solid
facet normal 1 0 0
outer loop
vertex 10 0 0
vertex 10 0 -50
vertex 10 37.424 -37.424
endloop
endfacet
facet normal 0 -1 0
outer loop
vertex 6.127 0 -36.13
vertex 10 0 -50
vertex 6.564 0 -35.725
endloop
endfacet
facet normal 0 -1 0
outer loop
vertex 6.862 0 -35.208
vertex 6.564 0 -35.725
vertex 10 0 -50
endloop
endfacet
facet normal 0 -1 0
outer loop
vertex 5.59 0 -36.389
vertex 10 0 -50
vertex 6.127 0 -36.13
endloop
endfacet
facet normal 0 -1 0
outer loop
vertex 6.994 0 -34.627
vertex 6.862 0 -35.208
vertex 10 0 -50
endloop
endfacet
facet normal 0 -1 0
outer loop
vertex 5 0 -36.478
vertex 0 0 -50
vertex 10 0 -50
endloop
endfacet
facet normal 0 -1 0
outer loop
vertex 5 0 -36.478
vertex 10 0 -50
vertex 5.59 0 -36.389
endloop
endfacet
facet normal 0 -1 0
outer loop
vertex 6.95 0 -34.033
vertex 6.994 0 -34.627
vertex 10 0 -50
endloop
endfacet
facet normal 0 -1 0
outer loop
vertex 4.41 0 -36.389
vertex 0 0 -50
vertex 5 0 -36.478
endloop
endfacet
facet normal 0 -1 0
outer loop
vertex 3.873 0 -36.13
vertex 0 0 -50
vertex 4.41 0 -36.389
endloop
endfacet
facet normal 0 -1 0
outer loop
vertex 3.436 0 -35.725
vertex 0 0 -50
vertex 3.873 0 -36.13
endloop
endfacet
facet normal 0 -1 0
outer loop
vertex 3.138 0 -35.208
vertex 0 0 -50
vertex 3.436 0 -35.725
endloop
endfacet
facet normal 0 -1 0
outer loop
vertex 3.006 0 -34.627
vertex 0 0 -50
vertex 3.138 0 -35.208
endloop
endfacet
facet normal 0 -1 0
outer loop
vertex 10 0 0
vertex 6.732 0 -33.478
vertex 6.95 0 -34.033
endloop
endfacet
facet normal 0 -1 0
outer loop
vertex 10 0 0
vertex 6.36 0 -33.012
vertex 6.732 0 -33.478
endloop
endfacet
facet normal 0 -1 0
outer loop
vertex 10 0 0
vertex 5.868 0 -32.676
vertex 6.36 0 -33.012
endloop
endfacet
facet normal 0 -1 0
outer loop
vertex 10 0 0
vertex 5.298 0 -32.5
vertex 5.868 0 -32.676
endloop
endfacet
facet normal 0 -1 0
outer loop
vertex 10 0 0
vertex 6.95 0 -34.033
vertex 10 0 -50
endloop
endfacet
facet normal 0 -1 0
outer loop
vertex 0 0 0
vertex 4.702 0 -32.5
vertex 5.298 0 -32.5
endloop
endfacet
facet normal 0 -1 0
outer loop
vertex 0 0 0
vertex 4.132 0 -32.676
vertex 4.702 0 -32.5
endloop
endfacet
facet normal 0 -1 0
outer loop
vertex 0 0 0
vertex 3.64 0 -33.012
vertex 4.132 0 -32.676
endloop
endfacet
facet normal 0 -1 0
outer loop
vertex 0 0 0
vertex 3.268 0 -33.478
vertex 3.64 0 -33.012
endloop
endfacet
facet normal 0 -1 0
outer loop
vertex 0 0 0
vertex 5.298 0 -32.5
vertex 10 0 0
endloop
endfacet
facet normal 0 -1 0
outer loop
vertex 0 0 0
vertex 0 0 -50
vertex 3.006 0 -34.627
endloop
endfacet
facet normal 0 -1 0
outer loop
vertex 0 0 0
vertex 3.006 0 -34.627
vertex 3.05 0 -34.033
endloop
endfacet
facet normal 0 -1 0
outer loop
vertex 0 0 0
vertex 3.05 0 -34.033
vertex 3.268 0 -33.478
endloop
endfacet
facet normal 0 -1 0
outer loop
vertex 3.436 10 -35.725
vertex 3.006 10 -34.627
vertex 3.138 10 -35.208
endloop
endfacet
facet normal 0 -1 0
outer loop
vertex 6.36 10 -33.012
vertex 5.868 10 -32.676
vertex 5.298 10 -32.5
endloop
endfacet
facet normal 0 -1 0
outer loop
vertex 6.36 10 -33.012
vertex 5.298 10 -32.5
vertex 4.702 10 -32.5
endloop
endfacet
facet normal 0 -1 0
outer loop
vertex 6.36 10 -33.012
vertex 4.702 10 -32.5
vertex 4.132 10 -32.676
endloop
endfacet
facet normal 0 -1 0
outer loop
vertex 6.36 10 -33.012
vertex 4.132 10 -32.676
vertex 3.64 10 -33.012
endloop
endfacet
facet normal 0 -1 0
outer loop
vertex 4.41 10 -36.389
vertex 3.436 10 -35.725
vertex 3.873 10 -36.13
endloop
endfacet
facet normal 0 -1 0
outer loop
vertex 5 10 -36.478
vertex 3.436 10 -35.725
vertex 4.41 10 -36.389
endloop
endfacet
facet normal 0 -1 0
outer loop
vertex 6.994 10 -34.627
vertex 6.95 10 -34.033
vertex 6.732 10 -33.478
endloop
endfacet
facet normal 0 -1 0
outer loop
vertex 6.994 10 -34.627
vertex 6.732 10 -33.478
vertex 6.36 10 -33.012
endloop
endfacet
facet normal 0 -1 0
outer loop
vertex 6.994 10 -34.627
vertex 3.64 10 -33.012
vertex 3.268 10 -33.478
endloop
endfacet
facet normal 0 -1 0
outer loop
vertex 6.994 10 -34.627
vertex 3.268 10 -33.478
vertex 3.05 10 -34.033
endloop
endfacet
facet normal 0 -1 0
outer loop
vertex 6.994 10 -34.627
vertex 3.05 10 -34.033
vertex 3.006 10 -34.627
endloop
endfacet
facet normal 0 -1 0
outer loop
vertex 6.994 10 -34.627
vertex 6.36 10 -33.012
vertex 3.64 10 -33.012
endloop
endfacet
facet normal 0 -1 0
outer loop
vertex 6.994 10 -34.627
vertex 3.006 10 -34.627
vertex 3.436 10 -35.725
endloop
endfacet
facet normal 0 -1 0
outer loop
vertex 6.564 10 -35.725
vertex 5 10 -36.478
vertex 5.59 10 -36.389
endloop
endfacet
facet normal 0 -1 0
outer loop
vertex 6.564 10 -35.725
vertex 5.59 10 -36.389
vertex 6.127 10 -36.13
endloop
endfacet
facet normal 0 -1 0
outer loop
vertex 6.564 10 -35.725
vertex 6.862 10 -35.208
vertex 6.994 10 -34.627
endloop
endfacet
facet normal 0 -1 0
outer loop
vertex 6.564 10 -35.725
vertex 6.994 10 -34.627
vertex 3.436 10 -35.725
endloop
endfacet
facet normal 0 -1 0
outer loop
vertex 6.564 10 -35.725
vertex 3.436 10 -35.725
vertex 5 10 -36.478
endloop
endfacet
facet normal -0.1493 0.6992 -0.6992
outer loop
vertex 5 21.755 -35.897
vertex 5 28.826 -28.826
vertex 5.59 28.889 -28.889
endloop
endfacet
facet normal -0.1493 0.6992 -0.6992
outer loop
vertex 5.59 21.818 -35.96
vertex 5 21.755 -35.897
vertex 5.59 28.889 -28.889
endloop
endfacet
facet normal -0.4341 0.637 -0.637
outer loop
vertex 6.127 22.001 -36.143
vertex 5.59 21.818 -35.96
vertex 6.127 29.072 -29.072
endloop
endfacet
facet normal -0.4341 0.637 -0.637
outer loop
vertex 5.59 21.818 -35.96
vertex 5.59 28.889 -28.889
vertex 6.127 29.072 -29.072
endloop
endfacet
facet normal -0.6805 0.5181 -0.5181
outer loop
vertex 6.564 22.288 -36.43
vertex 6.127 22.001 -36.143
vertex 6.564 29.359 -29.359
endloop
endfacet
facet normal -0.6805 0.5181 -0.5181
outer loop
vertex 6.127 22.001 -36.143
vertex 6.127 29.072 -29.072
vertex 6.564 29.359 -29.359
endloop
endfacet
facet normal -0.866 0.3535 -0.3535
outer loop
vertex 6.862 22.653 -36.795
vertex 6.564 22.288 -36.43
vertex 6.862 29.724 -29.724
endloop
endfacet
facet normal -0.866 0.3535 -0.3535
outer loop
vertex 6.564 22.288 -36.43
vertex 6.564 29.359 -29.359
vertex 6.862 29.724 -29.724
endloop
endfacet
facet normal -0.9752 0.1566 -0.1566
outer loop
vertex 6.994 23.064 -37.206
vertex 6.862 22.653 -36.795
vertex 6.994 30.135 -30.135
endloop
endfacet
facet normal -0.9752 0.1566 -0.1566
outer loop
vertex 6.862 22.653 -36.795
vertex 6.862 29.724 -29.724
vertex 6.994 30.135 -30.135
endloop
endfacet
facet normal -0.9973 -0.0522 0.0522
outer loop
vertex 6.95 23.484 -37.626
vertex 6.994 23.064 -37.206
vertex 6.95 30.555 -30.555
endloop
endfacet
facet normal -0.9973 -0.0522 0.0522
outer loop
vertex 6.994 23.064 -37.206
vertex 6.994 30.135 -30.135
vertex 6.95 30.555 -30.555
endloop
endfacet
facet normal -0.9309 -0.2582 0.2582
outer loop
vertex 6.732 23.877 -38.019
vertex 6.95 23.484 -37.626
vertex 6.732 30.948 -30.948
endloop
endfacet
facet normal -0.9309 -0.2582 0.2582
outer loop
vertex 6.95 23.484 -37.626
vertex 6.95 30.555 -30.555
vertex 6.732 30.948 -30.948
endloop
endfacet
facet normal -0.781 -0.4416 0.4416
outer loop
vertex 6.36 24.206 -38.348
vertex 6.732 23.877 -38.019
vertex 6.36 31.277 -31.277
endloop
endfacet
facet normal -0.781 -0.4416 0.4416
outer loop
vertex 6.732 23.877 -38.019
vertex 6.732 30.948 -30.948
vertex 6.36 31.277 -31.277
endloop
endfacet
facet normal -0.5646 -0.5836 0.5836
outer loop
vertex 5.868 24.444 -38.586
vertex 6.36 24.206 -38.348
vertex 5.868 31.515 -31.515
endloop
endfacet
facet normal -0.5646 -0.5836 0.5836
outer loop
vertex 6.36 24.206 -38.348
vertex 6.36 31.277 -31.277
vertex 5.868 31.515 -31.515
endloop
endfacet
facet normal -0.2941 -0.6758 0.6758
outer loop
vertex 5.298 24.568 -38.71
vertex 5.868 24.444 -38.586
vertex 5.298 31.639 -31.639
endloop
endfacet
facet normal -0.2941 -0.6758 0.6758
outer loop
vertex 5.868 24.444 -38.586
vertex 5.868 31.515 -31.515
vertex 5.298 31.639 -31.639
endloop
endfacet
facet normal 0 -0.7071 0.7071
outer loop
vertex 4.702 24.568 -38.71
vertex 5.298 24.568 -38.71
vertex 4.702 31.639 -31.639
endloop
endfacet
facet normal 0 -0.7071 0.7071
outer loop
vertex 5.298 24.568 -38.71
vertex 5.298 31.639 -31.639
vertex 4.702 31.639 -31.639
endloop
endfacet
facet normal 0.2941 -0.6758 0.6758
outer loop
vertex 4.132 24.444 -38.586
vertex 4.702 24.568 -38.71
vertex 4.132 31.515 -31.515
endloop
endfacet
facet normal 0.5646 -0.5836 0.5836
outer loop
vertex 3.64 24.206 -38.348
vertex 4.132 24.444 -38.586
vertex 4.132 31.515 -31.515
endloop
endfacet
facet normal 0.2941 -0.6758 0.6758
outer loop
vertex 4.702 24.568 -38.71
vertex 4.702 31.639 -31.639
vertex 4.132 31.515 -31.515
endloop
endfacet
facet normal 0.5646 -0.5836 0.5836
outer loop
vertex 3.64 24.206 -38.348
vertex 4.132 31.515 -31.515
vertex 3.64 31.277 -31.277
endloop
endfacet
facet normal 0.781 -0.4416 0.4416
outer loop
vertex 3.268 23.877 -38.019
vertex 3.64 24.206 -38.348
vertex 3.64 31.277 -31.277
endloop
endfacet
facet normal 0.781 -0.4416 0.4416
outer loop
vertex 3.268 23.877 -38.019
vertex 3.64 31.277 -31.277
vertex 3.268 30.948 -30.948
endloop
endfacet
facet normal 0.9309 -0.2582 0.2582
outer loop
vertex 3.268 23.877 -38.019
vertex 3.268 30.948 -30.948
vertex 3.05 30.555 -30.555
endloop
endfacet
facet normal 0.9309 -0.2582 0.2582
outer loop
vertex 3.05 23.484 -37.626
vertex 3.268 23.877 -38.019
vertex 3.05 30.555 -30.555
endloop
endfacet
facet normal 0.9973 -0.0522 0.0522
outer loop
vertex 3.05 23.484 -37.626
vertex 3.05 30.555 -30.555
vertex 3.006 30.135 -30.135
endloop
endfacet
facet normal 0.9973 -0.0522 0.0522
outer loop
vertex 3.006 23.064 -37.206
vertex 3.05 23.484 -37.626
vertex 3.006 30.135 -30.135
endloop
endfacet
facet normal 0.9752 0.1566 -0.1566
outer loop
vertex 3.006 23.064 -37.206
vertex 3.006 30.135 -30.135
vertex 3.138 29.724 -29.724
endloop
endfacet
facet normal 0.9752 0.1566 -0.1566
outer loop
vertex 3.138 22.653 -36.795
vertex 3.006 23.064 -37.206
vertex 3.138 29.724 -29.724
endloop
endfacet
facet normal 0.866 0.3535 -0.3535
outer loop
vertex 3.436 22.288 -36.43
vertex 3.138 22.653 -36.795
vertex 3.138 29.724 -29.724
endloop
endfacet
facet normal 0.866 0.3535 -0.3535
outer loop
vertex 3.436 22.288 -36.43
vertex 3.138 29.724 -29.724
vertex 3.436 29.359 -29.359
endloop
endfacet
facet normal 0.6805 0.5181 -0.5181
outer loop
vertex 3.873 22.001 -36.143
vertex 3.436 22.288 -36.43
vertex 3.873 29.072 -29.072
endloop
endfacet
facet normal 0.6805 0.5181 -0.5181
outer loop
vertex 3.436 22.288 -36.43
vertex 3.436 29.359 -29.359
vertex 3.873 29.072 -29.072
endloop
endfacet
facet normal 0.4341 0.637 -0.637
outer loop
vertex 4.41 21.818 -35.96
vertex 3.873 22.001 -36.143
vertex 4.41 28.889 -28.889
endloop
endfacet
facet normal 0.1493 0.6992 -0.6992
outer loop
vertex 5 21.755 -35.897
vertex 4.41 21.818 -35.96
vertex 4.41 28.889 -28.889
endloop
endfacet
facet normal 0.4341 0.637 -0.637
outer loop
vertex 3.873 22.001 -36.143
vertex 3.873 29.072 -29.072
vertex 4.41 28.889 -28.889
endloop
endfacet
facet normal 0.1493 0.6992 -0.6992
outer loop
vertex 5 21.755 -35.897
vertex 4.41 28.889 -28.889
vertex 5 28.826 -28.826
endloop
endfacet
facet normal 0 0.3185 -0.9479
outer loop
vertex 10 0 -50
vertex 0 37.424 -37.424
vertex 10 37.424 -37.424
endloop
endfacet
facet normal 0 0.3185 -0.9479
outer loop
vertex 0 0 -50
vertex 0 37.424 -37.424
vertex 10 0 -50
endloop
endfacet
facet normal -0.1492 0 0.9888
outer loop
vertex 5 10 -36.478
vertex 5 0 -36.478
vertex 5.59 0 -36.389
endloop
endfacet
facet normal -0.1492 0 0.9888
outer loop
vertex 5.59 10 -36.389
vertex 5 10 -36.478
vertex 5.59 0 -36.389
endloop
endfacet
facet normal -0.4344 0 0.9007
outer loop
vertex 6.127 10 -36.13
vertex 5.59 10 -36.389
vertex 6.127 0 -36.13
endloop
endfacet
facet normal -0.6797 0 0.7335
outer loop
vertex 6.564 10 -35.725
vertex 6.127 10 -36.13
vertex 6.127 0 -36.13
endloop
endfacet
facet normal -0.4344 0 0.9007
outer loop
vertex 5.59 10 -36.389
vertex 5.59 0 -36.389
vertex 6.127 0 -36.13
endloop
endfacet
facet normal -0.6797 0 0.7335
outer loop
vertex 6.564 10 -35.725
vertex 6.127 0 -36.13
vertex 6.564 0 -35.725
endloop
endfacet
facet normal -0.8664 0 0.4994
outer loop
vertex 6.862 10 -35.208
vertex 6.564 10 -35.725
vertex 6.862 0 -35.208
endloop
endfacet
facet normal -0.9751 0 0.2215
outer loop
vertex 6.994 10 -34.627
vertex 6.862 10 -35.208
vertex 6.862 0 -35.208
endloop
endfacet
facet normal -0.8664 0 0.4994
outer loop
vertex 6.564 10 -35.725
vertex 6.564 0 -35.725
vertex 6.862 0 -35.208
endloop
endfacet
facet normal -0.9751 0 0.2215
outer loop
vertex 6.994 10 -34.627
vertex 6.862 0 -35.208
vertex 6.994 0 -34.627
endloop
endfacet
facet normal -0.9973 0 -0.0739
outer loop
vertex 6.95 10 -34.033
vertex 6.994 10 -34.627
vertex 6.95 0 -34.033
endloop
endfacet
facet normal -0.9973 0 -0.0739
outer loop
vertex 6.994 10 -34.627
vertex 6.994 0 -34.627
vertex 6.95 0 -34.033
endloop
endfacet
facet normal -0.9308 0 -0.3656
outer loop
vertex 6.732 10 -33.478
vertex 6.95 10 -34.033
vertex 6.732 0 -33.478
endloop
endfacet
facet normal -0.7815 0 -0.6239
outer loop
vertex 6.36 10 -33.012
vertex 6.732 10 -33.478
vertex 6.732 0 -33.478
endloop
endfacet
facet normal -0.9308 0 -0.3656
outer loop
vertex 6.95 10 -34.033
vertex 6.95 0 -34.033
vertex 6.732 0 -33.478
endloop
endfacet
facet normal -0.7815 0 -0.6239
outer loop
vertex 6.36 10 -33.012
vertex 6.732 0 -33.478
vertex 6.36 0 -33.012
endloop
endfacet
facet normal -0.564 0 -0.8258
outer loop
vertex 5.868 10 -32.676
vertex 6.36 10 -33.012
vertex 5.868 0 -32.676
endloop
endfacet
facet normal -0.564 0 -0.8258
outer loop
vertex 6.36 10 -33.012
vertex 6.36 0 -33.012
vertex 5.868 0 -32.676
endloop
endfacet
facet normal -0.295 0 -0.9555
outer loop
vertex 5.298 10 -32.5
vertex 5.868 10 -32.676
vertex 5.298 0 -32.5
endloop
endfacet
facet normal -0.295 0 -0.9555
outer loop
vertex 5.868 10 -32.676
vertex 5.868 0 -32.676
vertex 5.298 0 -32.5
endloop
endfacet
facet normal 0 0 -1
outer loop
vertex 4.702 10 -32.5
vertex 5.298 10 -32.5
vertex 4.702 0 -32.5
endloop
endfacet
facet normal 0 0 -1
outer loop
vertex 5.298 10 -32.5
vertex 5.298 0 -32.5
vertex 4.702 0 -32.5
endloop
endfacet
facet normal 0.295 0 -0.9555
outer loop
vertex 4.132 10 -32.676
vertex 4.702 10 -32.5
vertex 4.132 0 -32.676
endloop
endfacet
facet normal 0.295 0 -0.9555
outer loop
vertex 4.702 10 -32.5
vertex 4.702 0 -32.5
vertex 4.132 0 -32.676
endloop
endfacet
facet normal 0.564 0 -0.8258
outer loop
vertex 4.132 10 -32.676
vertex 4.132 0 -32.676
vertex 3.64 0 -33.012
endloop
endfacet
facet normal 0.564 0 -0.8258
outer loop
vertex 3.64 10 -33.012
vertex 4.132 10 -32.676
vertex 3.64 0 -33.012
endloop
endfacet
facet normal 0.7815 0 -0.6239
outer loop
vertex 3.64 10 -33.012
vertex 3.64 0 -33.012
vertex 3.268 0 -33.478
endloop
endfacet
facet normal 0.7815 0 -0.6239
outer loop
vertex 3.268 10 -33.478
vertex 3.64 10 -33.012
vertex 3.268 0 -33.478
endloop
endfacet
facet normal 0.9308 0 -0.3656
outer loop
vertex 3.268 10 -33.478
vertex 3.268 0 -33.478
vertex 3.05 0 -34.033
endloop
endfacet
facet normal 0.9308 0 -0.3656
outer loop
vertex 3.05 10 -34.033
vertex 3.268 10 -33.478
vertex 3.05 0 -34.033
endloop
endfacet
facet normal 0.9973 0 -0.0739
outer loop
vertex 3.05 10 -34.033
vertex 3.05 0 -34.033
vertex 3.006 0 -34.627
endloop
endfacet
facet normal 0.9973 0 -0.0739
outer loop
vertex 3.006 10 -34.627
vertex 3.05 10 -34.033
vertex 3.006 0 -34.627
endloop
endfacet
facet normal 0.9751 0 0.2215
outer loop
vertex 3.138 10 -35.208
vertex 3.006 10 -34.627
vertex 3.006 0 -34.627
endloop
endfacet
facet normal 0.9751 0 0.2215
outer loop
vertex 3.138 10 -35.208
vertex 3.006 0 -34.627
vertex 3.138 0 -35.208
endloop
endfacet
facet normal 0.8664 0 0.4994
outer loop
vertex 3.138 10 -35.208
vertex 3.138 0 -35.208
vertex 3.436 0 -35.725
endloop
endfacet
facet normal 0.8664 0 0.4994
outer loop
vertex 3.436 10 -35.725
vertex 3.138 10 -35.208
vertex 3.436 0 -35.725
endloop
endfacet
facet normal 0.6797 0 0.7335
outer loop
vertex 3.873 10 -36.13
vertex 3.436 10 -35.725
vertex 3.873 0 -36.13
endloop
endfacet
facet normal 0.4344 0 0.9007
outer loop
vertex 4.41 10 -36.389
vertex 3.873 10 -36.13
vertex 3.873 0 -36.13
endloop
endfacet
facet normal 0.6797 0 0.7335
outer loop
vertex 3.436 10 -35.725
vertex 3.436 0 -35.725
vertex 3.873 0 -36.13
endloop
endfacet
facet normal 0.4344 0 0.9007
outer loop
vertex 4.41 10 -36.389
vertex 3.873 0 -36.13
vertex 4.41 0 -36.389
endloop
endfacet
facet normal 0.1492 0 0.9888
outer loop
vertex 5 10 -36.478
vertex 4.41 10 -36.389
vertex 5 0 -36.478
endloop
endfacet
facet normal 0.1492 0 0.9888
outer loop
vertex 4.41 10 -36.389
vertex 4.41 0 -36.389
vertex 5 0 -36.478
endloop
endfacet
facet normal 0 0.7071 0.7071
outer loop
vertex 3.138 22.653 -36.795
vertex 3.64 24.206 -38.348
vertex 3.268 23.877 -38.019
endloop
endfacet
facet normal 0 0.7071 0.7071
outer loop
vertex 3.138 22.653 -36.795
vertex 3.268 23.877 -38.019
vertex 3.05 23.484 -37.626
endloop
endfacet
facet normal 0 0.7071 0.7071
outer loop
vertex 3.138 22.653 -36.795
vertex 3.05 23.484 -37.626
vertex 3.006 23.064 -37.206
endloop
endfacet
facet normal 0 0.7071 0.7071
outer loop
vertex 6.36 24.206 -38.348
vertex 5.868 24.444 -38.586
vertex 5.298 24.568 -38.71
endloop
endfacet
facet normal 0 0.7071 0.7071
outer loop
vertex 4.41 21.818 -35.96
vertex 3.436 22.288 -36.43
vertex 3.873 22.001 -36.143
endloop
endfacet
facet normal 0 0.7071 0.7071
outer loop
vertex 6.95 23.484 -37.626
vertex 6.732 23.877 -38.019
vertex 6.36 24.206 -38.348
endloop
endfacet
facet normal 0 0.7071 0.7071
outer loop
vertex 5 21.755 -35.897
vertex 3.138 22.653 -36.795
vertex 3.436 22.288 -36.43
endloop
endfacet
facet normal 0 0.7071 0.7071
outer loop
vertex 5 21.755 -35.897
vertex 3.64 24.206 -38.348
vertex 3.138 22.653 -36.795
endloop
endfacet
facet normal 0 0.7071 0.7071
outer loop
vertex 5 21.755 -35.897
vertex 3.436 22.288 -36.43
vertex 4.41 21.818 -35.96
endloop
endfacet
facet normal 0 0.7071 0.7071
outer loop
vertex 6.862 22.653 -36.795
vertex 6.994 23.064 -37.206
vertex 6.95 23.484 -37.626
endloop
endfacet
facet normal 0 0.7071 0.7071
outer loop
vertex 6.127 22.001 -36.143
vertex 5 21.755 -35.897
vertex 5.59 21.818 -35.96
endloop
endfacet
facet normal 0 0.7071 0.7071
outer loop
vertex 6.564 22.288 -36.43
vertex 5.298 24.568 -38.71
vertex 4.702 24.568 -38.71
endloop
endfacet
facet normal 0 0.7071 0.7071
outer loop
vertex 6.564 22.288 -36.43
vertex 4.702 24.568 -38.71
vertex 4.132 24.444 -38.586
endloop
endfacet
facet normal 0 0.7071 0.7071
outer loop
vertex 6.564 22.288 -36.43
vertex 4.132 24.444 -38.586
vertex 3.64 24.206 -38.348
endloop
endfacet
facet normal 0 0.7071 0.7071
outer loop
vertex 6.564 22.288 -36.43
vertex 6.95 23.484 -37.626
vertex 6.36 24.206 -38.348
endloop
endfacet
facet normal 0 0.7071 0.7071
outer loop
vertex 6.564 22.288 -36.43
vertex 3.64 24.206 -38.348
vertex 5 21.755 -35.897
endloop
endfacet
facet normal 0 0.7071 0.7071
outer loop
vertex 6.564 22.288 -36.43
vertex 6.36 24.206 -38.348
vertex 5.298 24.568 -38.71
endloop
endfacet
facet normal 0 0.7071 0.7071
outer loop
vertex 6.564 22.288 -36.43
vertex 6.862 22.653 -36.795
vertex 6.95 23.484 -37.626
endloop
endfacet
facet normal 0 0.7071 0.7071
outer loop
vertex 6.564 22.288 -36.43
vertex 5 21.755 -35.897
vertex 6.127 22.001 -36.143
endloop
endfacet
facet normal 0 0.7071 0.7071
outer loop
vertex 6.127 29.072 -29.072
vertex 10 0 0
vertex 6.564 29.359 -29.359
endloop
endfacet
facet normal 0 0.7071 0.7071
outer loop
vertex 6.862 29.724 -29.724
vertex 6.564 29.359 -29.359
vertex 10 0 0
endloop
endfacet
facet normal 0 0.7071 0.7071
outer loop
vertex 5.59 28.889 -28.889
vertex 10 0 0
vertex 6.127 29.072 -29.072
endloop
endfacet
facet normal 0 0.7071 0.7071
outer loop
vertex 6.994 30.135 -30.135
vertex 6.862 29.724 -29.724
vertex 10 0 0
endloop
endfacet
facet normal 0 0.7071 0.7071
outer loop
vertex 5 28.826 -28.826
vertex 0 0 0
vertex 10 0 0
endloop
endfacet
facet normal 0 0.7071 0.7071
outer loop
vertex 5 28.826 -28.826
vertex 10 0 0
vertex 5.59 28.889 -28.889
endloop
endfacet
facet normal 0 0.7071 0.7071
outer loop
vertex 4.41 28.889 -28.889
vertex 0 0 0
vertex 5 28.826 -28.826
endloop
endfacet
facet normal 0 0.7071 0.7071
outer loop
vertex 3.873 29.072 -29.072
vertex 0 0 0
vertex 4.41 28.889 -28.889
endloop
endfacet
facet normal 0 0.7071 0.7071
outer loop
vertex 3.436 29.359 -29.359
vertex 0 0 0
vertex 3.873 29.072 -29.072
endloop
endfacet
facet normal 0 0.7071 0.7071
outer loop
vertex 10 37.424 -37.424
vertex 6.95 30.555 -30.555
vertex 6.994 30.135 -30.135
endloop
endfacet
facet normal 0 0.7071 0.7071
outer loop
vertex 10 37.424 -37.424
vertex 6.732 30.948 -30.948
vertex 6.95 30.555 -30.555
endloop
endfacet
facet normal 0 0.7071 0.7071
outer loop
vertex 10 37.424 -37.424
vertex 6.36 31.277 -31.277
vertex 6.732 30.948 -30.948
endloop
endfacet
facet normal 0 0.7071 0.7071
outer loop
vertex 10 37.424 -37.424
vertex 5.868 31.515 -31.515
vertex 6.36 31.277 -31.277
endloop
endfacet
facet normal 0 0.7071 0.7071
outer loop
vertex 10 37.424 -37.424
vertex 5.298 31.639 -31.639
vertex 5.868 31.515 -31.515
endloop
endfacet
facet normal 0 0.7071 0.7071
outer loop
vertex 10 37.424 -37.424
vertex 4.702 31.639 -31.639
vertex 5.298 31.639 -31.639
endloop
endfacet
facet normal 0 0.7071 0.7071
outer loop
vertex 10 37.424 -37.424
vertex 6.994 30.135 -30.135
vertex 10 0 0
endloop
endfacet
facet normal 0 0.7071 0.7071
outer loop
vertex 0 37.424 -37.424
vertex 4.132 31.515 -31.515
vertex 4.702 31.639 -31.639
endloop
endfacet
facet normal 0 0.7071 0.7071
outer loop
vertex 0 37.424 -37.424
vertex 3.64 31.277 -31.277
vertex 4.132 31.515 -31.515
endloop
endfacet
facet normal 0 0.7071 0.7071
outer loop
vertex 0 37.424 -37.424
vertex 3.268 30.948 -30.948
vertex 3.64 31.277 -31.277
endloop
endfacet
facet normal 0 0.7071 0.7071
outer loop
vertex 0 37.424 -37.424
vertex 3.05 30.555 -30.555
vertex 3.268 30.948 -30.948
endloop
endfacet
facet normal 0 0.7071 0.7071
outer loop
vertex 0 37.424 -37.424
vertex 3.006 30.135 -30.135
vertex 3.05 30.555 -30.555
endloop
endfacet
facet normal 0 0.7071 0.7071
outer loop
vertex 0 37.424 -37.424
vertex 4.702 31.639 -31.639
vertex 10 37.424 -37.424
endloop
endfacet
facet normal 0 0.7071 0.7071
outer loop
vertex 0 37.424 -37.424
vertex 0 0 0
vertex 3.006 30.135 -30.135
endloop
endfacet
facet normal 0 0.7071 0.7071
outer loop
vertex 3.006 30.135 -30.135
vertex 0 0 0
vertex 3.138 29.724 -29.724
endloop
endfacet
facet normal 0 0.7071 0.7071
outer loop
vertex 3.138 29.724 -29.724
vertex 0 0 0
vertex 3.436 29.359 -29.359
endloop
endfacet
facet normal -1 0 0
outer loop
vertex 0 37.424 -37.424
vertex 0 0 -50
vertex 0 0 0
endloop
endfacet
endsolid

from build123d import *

# Parameters (mm, degrees)
SALIENTE_EXTRUIR1_DEPTH = 10
CROQUIS2_R              = 2
CORTAR_EXTRUIR1_DEPTH   = 10
CROQUIS3_R              = 2
CORTAR_EXTRUIR2_DEPTH   = 10


with BuildPart() as part:
    # Croquis1 → Saliente-Extruir1 (new body)
    with BuildSketch(Plane(origin=(0, 0, 0), x_dir=(0, 0, -1), z_dir=(1, 0, 0))):
        Polygon((0, 0), (37.42423058, 37.42423058), (50, 0), align=None)
    extrude(amount=SALIENTE_EXTRUIR1_DEPTH)

    # Croquis2 → Cortar-Extruir1 (cut)
    with BuildSketch(Plane.XZ):
        with Locations(Location((5, -34.477712546, 0), (0, 0, 270))):
            Circle(CROQUIS2_R)
    extrude(amount=-CORTAR_EXTRUIR1_DEPTH, mode=Mode.SUBTRACT)

    # Croquis3 → Cortar-Extruir2 (cut)
    with BuildSketch(Plane(origin=(0, 0, 0), x_dir=(1, 0, 0), z_dir=(0, 0.7071067811865512, 0.7071067811865439))):
        with Locations(Location((5, 42.766502378, 0), (0, 0, 270))):
            Circle(CROQUIS3_R)
    extrude(amount=-CORTAR_EXTRUIR2_DEPTH, mode=Mode.SUBTRACT)


solid = part.part
